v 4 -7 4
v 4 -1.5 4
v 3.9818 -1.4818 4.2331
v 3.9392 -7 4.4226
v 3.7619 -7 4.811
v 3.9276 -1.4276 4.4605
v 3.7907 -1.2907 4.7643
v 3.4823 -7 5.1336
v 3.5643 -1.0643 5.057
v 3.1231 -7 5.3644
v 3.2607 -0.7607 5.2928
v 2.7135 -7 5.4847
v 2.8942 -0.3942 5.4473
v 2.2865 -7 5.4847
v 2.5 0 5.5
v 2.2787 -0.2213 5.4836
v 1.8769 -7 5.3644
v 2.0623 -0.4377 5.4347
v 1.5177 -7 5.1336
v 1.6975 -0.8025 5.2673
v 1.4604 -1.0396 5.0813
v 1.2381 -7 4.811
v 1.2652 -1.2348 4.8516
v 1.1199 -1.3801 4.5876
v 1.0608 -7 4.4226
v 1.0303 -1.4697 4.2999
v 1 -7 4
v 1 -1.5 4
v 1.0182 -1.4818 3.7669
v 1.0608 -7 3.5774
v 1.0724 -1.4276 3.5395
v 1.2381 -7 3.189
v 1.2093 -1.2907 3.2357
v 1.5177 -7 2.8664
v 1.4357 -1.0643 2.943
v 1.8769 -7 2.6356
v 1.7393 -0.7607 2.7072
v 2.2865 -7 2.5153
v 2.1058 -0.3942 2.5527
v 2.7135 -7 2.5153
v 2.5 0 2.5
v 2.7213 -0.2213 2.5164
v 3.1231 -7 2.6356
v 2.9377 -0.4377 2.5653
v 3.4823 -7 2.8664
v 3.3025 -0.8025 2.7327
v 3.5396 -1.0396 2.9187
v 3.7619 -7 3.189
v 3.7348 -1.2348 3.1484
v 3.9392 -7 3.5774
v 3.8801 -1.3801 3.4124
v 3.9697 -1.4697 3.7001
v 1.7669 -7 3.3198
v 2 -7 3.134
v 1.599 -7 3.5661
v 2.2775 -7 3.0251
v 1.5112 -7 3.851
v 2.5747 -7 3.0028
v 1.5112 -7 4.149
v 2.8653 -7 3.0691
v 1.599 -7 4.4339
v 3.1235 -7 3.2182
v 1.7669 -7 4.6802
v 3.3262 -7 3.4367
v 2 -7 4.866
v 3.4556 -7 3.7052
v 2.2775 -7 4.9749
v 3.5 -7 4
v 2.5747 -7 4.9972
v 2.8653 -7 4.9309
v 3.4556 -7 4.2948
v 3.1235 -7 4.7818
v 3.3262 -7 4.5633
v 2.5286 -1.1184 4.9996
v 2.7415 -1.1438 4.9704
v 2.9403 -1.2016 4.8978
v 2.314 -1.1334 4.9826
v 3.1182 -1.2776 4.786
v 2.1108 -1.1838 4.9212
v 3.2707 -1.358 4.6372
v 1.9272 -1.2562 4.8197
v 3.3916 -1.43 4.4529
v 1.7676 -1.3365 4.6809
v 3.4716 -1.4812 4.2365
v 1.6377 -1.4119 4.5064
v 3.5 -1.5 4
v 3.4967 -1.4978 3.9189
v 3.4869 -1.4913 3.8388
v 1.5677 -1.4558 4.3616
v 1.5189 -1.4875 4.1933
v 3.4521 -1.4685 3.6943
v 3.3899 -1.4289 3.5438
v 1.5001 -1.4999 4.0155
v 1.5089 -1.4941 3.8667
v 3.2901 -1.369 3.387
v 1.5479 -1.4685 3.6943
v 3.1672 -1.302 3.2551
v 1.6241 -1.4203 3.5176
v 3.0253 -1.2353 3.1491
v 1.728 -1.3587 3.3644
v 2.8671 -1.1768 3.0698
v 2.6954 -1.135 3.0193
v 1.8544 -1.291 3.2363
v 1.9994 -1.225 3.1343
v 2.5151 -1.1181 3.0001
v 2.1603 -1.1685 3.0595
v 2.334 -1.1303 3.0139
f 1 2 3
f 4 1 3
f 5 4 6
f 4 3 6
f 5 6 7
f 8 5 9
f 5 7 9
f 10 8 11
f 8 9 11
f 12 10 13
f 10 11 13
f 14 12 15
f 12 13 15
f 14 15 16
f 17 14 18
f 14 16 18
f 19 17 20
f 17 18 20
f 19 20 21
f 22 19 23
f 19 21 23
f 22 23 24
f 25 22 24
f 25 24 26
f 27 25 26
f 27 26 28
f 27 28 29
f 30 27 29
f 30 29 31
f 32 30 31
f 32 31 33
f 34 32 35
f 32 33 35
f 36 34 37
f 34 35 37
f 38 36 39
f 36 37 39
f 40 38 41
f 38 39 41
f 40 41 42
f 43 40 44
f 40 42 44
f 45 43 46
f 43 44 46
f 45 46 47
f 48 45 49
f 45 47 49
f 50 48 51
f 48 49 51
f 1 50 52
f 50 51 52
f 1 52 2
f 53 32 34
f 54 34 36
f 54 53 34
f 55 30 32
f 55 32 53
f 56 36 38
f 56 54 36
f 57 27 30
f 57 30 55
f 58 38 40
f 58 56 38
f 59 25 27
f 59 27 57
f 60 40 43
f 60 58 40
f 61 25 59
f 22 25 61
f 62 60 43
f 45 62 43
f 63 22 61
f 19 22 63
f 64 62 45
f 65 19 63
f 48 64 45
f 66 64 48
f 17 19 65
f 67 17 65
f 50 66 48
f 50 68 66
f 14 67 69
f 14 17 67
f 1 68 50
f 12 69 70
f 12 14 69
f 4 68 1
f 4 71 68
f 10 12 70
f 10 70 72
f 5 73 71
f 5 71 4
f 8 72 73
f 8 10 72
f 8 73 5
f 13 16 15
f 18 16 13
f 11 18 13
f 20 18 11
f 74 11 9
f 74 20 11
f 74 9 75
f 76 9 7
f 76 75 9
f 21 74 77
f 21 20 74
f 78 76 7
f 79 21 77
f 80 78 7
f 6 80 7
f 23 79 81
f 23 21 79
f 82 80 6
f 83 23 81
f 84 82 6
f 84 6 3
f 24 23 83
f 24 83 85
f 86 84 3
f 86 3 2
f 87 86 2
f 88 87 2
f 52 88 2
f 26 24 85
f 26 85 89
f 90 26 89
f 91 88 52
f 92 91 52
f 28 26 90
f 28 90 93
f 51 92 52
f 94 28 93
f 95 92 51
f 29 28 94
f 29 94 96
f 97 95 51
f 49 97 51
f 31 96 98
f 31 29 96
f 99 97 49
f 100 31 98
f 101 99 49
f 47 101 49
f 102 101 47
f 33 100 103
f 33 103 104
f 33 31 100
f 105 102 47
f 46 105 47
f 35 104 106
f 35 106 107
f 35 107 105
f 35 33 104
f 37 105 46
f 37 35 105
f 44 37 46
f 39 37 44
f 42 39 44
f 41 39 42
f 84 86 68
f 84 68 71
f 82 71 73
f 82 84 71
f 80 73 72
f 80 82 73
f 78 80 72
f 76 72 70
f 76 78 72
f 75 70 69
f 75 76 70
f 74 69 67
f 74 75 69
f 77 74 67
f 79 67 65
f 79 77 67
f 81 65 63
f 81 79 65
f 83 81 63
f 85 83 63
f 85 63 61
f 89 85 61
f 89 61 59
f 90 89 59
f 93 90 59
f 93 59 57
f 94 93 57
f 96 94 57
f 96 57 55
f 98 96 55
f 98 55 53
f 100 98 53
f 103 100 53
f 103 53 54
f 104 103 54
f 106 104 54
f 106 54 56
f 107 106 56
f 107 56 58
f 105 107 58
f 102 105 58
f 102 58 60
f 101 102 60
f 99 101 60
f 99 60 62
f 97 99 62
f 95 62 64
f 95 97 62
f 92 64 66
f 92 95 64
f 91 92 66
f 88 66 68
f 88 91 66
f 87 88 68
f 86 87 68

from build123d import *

# Parameters (mm, degrees)
CYLINDER001_R     = 1.5
CYLINDER001_DEPTH = 3
TUBE_R            = 1.5
TUBE_R_2          = 1
TUBE_DEPTH        = 7


with BuildPart() as cylinder001:
    # Cylinder001 → Cylinder001 (new body)
    with BuildSketch(Plane(origin=(1, 0, 4), x_dir=(0, 1, 0), z_dir=(1, 0, 0))):
        Circle(CYLINDER001_R)
    extrude(amount=CYLINDER001_DEPTH)


with BuildPart() as cut001:
    # Tube → Tube (new body)
    with BuildSketch(Plane(origin=(2.5, 0, 4), x_dir=(1, 0, 0), z_dir=(0, -1, 0))):
        Circle(TUBE_R)
        Circle(TUBE_R_2, mode=Mode.SUBTRACT)
    extrude(amount=TUBE_DEPTH)

    # Cut001: cut Cylinder001
    add(cylinder001.part, mode=Mode.SUBTRACT)


solid = cut001.part
